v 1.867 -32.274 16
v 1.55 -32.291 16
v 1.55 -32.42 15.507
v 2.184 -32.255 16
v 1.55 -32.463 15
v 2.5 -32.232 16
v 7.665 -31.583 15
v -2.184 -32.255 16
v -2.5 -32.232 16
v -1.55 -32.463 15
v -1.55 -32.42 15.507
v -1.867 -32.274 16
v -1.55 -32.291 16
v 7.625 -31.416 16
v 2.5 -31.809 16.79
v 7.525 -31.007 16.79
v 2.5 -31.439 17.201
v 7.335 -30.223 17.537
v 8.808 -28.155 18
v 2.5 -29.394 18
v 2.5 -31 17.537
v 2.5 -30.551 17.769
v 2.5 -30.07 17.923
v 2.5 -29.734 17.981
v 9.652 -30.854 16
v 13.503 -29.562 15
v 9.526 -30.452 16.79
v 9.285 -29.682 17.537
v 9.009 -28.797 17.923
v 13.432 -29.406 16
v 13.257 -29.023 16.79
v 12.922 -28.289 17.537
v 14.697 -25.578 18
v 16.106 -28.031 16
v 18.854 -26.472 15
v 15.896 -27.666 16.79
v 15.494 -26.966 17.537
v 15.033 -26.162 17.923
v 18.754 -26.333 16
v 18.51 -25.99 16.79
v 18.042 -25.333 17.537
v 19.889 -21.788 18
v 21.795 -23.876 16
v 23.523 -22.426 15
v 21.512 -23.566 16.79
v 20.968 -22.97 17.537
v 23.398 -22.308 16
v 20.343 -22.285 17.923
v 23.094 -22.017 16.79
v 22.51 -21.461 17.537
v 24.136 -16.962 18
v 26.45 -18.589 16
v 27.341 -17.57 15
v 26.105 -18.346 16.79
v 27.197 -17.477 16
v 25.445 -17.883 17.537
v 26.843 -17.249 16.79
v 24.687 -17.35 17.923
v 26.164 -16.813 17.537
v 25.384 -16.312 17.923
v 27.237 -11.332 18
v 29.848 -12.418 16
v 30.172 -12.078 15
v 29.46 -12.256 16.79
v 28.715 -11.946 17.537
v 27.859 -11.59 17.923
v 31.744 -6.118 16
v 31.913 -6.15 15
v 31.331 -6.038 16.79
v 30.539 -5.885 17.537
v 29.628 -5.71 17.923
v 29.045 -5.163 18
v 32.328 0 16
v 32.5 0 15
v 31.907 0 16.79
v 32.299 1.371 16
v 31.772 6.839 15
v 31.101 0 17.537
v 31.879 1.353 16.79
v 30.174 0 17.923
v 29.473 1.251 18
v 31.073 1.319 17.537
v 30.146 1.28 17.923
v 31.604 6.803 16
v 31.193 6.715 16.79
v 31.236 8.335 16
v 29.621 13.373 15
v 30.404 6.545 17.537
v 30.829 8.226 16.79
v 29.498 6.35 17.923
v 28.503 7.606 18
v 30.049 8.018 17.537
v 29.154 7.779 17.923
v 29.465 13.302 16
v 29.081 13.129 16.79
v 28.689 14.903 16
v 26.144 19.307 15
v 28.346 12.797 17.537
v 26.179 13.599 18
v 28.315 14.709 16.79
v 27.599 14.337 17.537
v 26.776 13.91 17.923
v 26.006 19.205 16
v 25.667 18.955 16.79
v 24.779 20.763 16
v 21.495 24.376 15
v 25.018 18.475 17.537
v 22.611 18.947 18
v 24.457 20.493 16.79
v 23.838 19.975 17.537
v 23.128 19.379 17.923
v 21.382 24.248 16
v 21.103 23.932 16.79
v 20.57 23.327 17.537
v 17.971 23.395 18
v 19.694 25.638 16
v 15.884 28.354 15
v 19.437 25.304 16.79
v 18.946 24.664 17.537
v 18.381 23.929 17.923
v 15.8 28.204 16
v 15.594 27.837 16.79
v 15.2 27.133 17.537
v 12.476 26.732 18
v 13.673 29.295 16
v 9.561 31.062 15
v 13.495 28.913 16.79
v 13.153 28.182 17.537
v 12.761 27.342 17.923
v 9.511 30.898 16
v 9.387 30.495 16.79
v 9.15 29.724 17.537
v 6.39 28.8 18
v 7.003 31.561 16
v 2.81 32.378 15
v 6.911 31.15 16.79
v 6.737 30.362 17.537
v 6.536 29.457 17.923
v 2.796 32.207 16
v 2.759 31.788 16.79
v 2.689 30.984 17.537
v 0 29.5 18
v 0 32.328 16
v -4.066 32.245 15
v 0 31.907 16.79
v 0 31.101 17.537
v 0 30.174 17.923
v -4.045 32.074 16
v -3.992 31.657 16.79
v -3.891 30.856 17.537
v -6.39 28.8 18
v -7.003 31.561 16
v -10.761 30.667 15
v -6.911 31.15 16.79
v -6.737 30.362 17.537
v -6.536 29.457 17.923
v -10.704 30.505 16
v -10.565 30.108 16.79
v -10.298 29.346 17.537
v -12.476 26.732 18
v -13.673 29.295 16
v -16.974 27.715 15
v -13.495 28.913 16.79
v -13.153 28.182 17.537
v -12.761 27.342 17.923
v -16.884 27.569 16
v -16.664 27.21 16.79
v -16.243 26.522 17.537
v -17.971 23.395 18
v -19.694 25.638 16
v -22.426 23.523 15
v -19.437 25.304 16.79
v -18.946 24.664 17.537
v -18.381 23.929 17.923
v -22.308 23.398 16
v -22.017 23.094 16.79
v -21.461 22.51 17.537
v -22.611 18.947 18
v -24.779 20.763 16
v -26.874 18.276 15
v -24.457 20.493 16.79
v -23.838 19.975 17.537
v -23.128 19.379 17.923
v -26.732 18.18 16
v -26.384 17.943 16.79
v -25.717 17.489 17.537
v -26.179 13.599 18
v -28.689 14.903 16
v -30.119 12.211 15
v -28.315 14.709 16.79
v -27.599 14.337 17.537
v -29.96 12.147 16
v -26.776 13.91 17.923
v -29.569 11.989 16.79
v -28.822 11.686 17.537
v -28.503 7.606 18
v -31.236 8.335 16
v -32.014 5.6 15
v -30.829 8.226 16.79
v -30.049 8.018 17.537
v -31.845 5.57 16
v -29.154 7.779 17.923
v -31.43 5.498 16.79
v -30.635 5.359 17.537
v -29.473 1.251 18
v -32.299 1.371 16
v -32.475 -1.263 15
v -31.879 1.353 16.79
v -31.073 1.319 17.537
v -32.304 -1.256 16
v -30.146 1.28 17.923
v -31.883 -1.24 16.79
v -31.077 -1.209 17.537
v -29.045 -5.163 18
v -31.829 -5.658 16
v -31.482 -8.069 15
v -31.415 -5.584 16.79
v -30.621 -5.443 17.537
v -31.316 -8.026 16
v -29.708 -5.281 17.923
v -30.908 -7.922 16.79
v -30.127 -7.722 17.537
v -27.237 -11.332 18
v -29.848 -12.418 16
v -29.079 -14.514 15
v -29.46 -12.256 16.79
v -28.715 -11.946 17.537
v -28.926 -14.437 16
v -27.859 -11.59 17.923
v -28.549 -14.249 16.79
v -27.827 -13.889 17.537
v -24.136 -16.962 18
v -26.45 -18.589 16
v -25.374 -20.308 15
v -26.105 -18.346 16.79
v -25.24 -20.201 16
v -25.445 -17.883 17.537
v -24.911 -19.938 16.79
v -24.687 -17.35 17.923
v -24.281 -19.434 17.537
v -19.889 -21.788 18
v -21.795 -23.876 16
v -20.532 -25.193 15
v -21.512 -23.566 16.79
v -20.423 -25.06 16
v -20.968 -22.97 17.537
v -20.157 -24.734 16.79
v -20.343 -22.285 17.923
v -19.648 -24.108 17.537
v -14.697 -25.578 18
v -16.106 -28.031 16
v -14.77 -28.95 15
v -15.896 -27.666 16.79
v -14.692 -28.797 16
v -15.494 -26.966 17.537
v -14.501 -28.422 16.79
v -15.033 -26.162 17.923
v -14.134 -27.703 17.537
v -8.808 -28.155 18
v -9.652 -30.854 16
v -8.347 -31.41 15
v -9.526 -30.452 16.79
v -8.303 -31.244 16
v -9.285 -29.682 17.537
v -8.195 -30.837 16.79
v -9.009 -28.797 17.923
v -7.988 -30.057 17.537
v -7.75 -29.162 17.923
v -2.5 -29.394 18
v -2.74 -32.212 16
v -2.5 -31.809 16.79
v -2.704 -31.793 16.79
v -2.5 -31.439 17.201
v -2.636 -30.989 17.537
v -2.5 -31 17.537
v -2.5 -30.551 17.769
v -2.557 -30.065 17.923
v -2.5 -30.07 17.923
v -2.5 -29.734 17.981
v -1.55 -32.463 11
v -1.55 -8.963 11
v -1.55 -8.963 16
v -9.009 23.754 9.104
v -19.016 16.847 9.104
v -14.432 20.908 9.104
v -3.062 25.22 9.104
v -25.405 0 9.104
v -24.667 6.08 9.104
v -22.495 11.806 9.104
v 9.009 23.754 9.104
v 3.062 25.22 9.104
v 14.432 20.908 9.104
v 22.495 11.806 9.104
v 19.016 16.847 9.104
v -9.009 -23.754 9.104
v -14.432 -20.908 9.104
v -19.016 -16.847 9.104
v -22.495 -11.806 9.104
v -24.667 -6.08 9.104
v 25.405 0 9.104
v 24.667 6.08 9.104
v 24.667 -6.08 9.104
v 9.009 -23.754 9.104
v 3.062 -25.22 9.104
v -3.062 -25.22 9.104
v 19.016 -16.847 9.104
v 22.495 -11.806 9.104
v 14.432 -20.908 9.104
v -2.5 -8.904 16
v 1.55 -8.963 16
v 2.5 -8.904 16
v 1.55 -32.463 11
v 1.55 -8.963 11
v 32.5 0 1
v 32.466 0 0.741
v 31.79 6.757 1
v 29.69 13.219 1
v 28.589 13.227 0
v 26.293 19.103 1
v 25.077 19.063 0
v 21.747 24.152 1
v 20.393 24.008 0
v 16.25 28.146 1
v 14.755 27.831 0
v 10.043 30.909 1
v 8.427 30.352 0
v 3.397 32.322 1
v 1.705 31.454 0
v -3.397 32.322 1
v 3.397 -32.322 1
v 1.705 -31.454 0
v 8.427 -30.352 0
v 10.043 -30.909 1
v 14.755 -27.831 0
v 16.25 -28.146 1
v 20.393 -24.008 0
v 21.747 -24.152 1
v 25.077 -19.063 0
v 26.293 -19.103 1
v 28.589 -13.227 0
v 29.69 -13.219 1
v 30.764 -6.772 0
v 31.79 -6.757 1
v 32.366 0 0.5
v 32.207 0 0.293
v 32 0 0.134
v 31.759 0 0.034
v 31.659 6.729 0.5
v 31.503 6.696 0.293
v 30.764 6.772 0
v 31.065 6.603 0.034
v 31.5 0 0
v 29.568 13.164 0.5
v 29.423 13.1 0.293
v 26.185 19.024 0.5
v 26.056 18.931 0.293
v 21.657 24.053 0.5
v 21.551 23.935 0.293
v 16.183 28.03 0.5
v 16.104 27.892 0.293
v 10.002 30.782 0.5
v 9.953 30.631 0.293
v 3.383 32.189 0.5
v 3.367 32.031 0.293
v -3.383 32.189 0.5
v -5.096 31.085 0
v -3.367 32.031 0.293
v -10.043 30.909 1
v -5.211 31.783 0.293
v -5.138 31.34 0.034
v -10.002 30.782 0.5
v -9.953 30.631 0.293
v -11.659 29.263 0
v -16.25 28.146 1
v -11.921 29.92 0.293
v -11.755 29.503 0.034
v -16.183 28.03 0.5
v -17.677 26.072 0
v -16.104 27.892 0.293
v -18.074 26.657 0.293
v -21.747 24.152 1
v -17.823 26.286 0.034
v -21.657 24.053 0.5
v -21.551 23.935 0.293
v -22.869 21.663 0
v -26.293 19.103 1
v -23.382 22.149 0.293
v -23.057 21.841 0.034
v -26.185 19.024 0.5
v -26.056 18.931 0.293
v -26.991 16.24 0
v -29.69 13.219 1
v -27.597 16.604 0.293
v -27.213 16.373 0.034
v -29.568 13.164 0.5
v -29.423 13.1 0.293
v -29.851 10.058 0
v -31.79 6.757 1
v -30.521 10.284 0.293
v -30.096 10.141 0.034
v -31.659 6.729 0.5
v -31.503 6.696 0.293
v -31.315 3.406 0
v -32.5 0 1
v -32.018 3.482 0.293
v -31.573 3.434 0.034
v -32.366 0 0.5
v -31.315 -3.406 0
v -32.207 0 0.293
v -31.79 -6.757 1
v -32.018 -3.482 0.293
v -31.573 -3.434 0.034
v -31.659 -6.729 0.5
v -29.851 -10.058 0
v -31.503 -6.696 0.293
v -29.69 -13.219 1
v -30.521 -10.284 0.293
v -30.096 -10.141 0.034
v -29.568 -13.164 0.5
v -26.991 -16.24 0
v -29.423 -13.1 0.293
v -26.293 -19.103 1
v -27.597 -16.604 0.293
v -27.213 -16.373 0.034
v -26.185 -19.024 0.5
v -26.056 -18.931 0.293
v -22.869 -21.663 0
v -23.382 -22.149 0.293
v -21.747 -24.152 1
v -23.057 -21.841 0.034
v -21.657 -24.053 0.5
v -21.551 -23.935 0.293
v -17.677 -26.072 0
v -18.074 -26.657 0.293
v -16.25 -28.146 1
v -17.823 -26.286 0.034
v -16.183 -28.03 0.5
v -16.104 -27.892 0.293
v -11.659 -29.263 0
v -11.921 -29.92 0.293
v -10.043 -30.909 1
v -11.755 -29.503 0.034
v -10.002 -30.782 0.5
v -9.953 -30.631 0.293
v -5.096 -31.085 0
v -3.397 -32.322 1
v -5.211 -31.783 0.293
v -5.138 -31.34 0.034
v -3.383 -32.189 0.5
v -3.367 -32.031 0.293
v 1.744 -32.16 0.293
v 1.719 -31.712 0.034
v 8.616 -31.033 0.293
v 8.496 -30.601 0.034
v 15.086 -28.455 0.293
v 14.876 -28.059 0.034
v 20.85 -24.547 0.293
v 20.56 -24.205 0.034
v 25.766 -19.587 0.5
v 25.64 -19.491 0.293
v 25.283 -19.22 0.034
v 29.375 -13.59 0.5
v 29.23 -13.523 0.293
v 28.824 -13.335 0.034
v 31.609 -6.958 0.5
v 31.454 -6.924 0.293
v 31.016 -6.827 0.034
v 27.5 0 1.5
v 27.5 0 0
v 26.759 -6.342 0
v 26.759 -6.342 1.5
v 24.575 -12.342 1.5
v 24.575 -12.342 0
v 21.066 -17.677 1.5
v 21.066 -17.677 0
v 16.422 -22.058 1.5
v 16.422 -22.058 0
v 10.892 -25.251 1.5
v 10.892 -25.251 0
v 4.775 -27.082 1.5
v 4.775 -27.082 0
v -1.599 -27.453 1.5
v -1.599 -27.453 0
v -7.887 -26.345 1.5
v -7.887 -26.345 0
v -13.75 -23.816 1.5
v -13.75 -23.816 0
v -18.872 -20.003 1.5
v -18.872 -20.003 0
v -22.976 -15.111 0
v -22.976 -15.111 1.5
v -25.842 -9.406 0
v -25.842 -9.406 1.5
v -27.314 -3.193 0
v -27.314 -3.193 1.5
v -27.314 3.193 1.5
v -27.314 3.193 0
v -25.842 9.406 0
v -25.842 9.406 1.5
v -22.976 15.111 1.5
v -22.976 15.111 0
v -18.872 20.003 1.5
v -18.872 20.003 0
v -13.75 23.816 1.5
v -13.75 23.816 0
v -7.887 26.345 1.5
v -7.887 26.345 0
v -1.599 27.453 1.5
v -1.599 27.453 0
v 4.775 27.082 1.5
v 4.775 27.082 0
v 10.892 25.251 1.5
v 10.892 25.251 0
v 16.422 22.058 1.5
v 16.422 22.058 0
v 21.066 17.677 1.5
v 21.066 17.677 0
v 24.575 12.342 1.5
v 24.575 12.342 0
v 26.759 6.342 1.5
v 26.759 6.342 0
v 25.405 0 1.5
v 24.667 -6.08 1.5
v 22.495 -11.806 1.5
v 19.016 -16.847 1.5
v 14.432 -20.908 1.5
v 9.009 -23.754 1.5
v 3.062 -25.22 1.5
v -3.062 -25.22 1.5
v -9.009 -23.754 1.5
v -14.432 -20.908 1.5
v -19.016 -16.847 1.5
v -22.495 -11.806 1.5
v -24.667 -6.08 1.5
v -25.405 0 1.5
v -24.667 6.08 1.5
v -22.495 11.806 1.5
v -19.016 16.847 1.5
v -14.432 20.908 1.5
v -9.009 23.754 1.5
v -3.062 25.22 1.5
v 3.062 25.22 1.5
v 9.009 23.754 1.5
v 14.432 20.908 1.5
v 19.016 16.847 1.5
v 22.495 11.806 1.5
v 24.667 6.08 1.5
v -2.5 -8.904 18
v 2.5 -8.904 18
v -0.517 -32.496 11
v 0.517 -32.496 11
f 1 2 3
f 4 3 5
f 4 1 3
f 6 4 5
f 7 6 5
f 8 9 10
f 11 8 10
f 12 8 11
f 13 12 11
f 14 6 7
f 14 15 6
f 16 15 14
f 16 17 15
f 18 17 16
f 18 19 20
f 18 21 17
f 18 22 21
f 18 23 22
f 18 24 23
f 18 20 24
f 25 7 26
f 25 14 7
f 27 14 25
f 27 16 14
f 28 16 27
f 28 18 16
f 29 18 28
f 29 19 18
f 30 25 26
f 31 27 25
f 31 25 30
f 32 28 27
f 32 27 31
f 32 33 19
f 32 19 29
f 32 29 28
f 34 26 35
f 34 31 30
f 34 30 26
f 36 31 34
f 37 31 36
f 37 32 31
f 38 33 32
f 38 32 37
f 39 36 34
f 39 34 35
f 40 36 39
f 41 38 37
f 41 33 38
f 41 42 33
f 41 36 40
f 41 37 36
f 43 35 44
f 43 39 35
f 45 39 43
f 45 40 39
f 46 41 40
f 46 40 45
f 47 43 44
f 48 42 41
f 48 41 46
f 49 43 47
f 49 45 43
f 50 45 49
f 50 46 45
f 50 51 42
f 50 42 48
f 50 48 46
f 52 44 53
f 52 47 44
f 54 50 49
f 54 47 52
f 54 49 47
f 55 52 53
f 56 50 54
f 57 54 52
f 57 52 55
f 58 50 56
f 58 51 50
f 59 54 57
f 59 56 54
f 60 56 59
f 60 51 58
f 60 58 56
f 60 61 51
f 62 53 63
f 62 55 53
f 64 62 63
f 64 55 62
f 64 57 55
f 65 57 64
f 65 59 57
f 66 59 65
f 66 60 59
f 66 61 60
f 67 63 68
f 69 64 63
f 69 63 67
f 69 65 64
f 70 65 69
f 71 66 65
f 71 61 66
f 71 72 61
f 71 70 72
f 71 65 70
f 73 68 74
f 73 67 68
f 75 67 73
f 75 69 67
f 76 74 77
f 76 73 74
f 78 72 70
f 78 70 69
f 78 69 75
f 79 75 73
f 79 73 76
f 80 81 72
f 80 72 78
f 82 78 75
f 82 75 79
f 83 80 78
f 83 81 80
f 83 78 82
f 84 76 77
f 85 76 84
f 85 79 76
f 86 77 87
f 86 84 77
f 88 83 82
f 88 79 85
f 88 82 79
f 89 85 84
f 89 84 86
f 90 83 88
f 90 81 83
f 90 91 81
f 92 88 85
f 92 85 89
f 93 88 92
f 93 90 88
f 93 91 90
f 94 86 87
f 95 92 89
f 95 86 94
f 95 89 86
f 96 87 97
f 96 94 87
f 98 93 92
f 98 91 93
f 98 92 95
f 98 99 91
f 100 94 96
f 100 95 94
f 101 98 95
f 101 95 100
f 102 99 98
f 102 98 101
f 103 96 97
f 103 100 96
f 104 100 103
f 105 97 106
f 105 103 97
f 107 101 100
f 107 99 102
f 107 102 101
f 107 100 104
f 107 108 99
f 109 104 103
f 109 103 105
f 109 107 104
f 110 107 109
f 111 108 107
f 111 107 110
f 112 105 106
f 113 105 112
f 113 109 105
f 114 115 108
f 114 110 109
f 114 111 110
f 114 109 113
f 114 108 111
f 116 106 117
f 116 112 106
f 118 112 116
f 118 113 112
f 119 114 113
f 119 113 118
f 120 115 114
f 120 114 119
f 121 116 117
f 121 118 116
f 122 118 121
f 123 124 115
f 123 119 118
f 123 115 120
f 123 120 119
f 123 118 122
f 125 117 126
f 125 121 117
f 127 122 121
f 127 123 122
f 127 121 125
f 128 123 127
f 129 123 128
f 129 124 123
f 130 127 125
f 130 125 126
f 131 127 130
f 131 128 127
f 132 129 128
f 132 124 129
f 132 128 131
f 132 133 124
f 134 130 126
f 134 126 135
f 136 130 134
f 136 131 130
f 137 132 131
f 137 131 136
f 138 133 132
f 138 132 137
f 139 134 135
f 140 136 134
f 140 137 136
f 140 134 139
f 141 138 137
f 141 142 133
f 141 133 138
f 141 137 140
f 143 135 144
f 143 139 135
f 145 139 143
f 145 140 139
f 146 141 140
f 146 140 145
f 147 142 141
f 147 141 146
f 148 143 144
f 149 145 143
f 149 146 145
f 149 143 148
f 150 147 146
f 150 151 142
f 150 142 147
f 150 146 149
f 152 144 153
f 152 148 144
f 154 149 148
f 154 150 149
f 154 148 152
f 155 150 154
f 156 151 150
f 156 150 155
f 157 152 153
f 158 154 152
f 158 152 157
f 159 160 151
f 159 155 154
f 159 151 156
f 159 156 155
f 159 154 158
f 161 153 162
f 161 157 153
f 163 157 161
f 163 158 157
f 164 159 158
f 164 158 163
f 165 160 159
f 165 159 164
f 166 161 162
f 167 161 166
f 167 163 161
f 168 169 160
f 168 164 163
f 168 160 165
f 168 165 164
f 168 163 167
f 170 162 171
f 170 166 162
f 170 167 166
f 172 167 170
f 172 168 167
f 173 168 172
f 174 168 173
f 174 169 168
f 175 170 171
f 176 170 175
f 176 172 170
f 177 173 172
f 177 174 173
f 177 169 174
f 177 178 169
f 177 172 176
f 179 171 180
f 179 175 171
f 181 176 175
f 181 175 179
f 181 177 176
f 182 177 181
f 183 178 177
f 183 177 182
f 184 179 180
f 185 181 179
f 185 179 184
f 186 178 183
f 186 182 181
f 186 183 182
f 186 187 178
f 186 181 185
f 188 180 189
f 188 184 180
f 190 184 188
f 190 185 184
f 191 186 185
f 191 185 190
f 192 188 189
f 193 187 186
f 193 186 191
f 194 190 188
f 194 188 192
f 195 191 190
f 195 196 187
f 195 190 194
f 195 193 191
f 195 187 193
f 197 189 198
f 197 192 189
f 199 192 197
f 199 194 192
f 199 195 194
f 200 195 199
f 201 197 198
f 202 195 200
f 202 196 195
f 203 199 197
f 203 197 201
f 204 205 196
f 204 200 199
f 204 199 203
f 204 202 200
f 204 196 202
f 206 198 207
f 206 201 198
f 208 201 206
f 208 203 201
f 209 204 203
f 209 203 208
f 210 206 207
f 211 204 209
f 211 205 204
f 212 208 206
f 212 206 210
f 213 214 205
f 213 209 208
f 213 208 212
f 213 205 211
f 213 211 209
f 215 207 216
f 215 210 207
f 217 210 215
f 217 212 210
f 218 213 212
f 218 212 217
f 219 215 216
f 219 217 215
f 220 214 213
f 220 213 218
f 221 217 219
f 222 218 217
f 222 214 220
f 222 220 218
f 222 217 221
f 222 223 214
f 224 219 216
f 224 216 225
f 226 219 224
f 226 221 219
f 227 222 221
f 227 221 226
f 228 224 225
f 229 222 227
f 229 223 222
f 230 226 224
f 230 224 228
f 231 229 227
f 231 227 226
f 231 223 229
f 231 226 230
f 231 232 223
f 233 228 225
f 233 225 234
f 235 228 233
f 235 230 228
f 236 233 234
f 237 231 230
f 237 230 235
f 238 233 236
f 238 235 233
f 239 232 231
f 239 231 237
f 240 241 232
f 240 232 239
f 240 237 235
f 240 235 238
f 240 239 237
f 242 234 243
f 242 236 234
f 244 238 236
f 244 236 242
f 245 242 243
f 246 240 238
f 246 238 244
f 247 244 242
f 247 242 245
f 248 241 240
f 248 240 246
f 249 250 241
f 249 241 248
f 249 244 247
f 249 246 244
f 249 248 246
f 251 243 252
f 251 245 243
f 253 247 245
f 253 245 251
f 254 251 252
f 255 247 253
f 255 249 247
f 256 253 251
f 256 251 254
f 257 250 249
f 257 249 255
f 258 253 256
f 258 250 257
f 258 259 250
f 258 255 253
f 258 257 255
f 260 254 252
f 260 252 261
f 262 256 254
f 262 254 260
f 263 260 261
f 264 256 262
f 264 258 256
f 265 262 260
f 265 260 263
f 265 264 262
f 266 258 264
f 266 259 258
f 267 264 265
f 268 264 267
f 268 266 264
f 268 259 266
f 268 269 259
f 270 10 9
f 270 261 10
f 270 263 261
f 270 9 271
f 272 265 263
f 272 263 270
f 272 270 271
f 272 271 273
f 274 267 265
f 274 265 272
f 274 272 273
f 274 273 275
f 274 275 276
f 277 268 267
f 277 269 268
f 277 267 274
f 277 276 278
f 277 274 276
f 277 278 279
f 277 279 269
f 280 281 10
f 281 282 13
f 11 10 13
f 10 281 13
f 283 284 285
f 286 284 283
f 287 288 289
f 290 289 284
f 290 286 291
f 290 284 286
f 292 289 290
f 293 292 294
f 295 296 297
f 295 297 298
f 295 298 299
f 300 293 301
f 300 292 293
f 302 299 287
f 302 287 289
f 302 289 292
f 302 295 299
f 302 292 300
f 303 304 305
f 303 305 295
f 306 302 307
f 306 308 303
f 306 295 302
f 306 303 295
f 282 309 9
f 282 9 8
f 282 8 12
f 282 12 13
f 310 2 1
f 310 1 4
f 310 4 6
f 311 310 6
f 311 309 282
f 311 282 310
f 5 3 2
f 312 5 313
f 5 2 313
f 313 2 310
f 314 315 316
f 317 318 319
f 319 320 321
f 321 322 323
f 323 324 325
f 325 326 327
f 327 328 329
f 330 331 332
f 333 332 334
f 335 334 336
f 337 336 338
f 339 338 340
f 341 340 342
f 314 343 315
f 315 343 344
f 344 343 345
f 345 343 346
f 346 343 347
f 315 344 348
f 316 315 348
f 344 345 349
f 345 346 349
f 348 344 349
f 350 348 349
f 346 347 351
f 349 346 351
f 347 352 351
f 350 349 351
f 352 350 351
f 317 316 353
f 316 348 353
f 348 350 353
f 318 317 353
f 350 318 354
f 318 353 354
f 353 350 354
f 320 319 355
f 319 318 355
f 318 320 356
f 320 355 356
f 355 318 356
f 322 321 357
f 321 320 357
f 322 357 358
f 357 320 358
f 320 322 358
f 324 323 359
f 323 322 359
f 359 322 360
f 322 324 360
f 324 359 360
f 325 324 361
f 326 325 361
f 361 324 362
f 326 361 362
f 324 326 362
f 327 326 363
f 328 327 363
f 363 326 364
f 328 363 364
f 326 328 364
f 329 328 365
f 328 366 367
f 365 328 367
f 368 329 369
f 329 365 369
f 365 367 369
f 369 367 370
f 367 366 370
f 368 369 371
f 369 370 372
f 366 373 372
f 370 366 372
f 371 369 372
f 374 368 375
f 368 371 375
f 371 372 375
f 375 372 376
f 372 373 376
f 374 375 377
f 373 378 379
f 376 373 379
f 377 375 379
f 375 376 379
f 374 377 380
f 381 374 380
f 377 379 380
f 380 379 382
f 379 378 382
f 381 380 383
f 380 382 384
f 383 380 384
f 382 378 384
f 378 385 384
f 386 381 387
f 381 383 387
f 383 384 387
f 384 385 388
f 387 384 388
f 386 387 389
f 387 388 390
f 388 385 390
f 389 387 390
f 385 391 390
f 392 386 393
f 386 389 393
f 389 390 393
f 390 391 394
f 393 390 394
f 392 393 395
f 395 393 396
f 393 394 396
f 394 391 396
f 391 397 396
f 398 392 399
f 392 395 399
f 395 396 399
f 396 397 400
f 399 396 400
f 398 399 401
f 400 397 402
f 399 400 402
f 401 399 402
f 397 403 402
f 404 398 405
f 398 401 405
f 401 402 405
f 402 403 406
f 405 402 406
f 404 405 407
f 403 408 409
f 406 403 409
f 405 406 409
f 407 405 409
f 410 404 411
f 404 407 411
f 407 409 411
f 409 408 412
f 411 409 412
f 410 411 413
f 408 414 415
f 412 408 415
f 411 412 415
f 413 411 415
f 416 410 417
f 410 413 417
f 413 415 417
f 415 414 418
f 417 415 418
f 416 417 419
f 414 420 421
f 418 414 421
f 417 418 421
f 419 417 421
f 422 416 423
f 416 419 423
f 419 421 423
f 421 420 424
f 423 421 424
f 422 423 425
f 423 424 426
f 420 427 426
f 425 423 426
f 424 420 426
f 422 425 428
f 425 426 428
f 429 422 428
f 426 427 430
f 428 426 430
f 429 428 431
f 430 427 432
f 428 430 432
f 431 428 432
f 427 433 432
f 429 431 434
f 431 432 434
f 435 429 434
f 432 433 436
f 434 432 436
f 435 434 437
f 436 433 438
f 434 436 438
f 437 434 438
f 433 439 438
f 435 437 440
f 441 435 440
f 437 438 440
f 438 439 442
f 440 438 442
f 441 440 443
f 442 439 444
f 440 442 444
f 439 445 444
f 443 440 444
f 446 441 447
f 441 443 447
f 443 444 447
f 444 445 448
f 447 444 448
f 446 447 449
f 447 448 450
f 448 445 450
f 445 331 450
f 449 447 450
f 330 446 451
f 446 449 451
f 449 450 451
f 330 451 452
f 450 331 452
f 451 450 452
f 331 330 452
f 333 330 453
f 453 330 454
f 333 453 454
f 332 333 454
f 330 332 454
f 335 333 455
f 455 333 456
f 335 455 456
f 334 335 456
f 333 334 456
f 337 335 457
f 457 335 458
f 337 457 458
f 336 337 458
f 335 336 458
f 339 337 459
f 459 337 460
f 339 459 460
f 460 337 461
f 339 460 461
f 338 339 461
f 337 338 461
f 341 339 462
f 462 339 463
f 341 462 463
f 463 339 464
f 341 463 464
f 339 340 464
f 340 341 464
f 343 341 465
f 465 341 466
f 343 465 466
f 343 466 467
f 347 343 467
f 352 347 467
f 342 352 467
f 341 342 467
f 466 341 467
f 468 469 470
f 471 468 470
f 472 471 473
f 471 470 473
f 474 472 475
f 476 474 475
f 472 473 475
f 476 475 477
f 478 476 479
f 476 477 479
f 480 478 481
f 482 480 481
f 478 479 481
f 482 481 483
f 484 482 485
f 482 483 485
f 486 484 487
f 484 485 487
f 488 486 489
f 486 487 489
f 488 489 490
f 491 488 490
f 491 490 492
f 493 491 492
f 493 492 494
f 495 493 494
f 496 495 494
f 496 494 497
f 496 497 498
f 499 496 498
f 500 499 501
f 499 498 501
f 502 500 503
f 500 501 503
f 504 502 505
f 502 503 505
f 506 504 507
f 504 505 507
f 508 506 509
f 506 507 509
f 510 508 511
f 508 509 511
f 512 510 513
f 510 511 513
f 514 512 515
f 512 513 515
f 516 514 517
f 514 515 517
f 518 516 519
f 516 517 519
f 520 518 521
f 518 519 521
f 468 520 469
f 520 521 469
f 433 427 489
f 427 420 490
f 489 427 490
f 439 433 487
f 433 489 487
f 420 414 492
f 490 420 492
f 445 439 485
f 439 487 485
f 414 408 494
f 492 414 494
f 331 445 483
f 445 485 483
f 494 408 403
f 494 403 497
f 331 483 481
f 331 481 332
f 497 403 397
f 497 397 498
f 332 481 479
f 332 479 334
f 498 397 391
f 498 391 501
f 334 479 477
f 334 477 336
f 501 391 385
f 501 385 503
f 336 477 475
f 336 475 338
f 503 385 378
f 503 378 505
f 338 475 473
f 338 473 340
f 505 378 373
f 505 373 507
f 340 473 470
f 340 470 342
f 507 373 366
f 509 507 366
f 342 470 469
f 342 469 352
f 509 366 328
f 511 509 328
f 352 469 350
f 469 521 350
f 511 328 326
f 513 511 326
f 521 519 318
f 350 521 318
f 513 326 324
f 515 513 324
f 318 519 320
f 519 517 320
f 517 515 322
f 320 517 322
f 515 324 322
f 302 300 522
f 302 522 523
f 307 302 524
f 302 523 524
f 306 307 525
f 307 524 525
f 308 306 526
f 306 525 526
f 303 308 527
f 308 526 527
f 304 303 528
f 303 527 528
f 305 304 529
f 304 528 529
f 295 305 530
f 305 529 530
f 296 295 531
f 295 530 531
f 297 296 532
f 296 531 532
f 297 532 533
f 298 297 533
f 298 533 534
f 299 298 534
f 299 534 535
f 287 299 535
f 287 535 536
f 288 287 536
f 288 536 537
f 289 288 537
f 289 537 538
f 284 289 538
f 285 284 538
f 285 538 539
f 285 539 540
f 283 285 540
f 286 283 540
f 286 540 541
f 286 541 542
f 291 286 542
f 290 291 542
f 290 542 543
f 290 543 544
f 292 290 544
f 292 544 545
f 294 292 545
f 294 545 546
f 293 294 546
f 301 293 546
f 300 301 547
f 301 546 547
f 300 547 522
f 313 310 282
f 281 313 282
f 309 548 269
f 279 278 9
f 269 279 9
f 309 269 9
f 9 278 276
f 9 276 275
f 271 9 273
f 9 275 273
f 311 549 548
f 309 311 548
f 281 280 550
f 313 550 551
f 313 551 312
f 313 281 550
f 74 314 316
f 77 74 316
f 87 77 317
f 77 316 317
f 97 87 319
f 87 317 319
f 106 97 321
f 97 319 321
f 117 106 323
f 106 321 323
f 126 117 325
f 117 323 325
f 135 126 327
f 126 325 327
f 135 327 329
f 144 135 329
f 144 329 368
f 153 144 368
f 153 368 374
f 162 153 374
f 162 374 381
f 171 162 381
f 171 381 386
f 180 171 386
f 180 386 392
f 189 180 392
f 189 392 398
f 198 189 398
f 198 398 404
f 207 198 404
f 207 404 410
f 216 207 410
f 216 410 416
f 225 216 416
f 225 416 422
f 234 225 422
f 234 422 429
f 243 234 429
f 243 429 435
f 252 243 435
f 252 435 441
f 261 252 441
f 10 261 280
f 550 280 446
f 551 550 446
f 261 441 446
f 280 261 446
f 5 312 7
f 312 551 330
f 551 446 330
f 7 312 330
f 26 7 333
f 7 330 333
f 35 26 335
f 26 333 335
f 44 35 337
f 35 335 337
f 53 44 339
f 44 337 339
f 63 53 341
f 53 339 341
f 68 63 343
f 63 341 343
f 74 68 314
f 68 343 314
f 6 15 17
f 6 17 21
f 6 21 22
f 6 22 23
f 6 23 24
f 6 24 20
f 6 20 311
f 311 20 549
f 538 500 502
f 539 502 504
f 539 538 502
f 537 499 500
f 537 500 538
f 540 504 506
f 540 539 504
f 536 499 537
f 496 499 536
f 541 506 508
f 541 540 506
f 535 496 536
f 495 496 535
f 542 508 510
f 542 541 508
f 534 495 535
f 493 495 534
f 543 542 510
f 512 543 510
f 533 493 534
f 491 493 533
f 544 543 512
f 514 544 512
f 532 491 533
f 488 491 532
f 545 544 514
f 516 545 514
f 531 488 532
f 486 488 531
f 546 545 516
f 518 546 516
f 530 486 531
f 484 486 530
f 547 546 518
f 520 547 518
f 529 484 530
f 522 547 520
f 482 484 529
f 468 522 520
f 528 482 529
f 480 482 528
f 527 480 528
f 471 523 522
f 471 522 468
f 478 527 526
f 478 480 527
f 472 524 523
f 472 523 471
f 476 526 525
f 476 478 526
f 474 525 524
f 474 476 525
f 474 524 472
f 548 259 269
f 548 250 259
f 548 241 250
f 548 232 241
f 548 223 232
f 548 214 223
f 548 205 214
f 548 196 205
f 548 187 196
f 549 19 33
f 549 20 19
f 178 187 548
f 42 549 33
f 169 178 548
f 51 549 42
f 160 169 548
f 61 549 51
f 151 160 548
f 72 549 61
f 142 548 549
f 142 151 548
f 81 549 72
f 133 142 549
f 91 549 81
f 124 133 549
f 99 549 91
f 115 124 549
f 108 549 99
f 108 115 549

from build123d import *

# Parameters (mm, degrees)
F0_R      = 32.5
F1_DEPTH  = 18
F2_R      = 3
F3_R      = 1
F4_R      = 25.405
F5_DEPTH  = 9.104
F6_R      = 27.5
F6_R_2    = 25.405
F7_DEPTH  = 1.5
F9_DEPTH  = 7
F11_DEPTH = 2


# Not quite as in the source:
# - the program builds the solid bodies; features that only make, move or delete a surface that nothing else refers to are left out


with BuildPart() as f1:
    # F0 (on Top) → F1 (new body)
    with BuildSketch(Plane.XY):
        Circle(F0_R)
    extrude(amount=F1_DEPTH)

    # F2
    f2_edges = [f1.edges().sort_by_distance(p)[0] for p in [
        (-32.5, 0, 18),
    ]]
    fillet(f2_edges, radius=F2_R)

    # F3
    f3_edges = [f1.edges().sort_by_distance(p)[0] for p in [
        (-32.5, 0, 0),
    ]]
    fillet(f3_edges, radius=F3_R)

    # F4 (on face) → F5 (cut)
    with BuildSketch(Plane(origin=(0, 0, 0), x_dir=(1, 0, 0), z_dir=(0, 0, -1))):
        Circle(F4_R)
    extrude(amount=-F5_DEPTH, mode=Mode.SUBTRACT)

    # F6 (on face) → F7 (cut)
    with BuildSketch(Plane(origin=(0, 0, 0), x_dir=(1, 0, 0), z_dir=(0, 0, -1))):
        Circle(F6_R)
        Circle(F6_R_2, mode=Mode.SUBTRACT)
    extrude(amount=-F7_DEPTH, mode=Mode.SUBTRACT)

    # F8 (on face) → F9 (cut)
    with BuildSketch(Plane.XY.offset(18)):
        with BuildLine():
            Line((1.55, -8.9630174198), (0, -8.9630174198))
            Line((0, -8.9630174198), (-1.55, -8.9630174198))
            Line((-1.55, -8.9630174198), (-1.55, -29.459251518))
            ThreePointArc((-1.55, -29.459251518), (0, -29.5), (1.55, -29.459251518))
            Line((1.55, -29.459251518), (1.55, -8.9630174198))
        make_face()
        with BuildLine():
            Line((1.55, -32.4630174198), (1.55, -29.459251518))
            ThreePointArc((1.55, -29.459251518), (0, -29.5), (-1.55, -29.459251518))
            Line((-1.55, -29.459251518), (-1.55, -32.4630174198))
            ThreePointArc((-1.55, -32.4630174198), (0, -32.5), (1.55, -32.4630174198))
        make_face()
    extrude(amount=-F9_DEPTH, mode=Mode.SUBTRACT)

    # F10 (on face) → F11 (cut)
    with BuildSketch(Plane.XY.offset(18)):
        with BuildLine():
            ThreePointArc((-2.5, -32.403703492), (-2.0252171576, -32.4368385553), (-1.55, -32.4630174198))
            ThreePointArc((-1.55, -32.4630174198), (0, -32.5), (1.55, -32.4630174198))
            ThreePointArc((1.55, -32.4630174198), (2.0252171576, -32.4368385553), (2.5, -32.403703492))
            Line((2.5, -32.403703492), (2.5, -8.903703492))
            Line((2.5, -8.903703492), (-2.5, -8.903703492))
            Line((-2.5, -8.903703492), (-2.5, -32.403703492))
        make_face()
    extrude(amount=-F11_DEPTH, mode=Mode.SUBTRACT)


solid = f1.part
